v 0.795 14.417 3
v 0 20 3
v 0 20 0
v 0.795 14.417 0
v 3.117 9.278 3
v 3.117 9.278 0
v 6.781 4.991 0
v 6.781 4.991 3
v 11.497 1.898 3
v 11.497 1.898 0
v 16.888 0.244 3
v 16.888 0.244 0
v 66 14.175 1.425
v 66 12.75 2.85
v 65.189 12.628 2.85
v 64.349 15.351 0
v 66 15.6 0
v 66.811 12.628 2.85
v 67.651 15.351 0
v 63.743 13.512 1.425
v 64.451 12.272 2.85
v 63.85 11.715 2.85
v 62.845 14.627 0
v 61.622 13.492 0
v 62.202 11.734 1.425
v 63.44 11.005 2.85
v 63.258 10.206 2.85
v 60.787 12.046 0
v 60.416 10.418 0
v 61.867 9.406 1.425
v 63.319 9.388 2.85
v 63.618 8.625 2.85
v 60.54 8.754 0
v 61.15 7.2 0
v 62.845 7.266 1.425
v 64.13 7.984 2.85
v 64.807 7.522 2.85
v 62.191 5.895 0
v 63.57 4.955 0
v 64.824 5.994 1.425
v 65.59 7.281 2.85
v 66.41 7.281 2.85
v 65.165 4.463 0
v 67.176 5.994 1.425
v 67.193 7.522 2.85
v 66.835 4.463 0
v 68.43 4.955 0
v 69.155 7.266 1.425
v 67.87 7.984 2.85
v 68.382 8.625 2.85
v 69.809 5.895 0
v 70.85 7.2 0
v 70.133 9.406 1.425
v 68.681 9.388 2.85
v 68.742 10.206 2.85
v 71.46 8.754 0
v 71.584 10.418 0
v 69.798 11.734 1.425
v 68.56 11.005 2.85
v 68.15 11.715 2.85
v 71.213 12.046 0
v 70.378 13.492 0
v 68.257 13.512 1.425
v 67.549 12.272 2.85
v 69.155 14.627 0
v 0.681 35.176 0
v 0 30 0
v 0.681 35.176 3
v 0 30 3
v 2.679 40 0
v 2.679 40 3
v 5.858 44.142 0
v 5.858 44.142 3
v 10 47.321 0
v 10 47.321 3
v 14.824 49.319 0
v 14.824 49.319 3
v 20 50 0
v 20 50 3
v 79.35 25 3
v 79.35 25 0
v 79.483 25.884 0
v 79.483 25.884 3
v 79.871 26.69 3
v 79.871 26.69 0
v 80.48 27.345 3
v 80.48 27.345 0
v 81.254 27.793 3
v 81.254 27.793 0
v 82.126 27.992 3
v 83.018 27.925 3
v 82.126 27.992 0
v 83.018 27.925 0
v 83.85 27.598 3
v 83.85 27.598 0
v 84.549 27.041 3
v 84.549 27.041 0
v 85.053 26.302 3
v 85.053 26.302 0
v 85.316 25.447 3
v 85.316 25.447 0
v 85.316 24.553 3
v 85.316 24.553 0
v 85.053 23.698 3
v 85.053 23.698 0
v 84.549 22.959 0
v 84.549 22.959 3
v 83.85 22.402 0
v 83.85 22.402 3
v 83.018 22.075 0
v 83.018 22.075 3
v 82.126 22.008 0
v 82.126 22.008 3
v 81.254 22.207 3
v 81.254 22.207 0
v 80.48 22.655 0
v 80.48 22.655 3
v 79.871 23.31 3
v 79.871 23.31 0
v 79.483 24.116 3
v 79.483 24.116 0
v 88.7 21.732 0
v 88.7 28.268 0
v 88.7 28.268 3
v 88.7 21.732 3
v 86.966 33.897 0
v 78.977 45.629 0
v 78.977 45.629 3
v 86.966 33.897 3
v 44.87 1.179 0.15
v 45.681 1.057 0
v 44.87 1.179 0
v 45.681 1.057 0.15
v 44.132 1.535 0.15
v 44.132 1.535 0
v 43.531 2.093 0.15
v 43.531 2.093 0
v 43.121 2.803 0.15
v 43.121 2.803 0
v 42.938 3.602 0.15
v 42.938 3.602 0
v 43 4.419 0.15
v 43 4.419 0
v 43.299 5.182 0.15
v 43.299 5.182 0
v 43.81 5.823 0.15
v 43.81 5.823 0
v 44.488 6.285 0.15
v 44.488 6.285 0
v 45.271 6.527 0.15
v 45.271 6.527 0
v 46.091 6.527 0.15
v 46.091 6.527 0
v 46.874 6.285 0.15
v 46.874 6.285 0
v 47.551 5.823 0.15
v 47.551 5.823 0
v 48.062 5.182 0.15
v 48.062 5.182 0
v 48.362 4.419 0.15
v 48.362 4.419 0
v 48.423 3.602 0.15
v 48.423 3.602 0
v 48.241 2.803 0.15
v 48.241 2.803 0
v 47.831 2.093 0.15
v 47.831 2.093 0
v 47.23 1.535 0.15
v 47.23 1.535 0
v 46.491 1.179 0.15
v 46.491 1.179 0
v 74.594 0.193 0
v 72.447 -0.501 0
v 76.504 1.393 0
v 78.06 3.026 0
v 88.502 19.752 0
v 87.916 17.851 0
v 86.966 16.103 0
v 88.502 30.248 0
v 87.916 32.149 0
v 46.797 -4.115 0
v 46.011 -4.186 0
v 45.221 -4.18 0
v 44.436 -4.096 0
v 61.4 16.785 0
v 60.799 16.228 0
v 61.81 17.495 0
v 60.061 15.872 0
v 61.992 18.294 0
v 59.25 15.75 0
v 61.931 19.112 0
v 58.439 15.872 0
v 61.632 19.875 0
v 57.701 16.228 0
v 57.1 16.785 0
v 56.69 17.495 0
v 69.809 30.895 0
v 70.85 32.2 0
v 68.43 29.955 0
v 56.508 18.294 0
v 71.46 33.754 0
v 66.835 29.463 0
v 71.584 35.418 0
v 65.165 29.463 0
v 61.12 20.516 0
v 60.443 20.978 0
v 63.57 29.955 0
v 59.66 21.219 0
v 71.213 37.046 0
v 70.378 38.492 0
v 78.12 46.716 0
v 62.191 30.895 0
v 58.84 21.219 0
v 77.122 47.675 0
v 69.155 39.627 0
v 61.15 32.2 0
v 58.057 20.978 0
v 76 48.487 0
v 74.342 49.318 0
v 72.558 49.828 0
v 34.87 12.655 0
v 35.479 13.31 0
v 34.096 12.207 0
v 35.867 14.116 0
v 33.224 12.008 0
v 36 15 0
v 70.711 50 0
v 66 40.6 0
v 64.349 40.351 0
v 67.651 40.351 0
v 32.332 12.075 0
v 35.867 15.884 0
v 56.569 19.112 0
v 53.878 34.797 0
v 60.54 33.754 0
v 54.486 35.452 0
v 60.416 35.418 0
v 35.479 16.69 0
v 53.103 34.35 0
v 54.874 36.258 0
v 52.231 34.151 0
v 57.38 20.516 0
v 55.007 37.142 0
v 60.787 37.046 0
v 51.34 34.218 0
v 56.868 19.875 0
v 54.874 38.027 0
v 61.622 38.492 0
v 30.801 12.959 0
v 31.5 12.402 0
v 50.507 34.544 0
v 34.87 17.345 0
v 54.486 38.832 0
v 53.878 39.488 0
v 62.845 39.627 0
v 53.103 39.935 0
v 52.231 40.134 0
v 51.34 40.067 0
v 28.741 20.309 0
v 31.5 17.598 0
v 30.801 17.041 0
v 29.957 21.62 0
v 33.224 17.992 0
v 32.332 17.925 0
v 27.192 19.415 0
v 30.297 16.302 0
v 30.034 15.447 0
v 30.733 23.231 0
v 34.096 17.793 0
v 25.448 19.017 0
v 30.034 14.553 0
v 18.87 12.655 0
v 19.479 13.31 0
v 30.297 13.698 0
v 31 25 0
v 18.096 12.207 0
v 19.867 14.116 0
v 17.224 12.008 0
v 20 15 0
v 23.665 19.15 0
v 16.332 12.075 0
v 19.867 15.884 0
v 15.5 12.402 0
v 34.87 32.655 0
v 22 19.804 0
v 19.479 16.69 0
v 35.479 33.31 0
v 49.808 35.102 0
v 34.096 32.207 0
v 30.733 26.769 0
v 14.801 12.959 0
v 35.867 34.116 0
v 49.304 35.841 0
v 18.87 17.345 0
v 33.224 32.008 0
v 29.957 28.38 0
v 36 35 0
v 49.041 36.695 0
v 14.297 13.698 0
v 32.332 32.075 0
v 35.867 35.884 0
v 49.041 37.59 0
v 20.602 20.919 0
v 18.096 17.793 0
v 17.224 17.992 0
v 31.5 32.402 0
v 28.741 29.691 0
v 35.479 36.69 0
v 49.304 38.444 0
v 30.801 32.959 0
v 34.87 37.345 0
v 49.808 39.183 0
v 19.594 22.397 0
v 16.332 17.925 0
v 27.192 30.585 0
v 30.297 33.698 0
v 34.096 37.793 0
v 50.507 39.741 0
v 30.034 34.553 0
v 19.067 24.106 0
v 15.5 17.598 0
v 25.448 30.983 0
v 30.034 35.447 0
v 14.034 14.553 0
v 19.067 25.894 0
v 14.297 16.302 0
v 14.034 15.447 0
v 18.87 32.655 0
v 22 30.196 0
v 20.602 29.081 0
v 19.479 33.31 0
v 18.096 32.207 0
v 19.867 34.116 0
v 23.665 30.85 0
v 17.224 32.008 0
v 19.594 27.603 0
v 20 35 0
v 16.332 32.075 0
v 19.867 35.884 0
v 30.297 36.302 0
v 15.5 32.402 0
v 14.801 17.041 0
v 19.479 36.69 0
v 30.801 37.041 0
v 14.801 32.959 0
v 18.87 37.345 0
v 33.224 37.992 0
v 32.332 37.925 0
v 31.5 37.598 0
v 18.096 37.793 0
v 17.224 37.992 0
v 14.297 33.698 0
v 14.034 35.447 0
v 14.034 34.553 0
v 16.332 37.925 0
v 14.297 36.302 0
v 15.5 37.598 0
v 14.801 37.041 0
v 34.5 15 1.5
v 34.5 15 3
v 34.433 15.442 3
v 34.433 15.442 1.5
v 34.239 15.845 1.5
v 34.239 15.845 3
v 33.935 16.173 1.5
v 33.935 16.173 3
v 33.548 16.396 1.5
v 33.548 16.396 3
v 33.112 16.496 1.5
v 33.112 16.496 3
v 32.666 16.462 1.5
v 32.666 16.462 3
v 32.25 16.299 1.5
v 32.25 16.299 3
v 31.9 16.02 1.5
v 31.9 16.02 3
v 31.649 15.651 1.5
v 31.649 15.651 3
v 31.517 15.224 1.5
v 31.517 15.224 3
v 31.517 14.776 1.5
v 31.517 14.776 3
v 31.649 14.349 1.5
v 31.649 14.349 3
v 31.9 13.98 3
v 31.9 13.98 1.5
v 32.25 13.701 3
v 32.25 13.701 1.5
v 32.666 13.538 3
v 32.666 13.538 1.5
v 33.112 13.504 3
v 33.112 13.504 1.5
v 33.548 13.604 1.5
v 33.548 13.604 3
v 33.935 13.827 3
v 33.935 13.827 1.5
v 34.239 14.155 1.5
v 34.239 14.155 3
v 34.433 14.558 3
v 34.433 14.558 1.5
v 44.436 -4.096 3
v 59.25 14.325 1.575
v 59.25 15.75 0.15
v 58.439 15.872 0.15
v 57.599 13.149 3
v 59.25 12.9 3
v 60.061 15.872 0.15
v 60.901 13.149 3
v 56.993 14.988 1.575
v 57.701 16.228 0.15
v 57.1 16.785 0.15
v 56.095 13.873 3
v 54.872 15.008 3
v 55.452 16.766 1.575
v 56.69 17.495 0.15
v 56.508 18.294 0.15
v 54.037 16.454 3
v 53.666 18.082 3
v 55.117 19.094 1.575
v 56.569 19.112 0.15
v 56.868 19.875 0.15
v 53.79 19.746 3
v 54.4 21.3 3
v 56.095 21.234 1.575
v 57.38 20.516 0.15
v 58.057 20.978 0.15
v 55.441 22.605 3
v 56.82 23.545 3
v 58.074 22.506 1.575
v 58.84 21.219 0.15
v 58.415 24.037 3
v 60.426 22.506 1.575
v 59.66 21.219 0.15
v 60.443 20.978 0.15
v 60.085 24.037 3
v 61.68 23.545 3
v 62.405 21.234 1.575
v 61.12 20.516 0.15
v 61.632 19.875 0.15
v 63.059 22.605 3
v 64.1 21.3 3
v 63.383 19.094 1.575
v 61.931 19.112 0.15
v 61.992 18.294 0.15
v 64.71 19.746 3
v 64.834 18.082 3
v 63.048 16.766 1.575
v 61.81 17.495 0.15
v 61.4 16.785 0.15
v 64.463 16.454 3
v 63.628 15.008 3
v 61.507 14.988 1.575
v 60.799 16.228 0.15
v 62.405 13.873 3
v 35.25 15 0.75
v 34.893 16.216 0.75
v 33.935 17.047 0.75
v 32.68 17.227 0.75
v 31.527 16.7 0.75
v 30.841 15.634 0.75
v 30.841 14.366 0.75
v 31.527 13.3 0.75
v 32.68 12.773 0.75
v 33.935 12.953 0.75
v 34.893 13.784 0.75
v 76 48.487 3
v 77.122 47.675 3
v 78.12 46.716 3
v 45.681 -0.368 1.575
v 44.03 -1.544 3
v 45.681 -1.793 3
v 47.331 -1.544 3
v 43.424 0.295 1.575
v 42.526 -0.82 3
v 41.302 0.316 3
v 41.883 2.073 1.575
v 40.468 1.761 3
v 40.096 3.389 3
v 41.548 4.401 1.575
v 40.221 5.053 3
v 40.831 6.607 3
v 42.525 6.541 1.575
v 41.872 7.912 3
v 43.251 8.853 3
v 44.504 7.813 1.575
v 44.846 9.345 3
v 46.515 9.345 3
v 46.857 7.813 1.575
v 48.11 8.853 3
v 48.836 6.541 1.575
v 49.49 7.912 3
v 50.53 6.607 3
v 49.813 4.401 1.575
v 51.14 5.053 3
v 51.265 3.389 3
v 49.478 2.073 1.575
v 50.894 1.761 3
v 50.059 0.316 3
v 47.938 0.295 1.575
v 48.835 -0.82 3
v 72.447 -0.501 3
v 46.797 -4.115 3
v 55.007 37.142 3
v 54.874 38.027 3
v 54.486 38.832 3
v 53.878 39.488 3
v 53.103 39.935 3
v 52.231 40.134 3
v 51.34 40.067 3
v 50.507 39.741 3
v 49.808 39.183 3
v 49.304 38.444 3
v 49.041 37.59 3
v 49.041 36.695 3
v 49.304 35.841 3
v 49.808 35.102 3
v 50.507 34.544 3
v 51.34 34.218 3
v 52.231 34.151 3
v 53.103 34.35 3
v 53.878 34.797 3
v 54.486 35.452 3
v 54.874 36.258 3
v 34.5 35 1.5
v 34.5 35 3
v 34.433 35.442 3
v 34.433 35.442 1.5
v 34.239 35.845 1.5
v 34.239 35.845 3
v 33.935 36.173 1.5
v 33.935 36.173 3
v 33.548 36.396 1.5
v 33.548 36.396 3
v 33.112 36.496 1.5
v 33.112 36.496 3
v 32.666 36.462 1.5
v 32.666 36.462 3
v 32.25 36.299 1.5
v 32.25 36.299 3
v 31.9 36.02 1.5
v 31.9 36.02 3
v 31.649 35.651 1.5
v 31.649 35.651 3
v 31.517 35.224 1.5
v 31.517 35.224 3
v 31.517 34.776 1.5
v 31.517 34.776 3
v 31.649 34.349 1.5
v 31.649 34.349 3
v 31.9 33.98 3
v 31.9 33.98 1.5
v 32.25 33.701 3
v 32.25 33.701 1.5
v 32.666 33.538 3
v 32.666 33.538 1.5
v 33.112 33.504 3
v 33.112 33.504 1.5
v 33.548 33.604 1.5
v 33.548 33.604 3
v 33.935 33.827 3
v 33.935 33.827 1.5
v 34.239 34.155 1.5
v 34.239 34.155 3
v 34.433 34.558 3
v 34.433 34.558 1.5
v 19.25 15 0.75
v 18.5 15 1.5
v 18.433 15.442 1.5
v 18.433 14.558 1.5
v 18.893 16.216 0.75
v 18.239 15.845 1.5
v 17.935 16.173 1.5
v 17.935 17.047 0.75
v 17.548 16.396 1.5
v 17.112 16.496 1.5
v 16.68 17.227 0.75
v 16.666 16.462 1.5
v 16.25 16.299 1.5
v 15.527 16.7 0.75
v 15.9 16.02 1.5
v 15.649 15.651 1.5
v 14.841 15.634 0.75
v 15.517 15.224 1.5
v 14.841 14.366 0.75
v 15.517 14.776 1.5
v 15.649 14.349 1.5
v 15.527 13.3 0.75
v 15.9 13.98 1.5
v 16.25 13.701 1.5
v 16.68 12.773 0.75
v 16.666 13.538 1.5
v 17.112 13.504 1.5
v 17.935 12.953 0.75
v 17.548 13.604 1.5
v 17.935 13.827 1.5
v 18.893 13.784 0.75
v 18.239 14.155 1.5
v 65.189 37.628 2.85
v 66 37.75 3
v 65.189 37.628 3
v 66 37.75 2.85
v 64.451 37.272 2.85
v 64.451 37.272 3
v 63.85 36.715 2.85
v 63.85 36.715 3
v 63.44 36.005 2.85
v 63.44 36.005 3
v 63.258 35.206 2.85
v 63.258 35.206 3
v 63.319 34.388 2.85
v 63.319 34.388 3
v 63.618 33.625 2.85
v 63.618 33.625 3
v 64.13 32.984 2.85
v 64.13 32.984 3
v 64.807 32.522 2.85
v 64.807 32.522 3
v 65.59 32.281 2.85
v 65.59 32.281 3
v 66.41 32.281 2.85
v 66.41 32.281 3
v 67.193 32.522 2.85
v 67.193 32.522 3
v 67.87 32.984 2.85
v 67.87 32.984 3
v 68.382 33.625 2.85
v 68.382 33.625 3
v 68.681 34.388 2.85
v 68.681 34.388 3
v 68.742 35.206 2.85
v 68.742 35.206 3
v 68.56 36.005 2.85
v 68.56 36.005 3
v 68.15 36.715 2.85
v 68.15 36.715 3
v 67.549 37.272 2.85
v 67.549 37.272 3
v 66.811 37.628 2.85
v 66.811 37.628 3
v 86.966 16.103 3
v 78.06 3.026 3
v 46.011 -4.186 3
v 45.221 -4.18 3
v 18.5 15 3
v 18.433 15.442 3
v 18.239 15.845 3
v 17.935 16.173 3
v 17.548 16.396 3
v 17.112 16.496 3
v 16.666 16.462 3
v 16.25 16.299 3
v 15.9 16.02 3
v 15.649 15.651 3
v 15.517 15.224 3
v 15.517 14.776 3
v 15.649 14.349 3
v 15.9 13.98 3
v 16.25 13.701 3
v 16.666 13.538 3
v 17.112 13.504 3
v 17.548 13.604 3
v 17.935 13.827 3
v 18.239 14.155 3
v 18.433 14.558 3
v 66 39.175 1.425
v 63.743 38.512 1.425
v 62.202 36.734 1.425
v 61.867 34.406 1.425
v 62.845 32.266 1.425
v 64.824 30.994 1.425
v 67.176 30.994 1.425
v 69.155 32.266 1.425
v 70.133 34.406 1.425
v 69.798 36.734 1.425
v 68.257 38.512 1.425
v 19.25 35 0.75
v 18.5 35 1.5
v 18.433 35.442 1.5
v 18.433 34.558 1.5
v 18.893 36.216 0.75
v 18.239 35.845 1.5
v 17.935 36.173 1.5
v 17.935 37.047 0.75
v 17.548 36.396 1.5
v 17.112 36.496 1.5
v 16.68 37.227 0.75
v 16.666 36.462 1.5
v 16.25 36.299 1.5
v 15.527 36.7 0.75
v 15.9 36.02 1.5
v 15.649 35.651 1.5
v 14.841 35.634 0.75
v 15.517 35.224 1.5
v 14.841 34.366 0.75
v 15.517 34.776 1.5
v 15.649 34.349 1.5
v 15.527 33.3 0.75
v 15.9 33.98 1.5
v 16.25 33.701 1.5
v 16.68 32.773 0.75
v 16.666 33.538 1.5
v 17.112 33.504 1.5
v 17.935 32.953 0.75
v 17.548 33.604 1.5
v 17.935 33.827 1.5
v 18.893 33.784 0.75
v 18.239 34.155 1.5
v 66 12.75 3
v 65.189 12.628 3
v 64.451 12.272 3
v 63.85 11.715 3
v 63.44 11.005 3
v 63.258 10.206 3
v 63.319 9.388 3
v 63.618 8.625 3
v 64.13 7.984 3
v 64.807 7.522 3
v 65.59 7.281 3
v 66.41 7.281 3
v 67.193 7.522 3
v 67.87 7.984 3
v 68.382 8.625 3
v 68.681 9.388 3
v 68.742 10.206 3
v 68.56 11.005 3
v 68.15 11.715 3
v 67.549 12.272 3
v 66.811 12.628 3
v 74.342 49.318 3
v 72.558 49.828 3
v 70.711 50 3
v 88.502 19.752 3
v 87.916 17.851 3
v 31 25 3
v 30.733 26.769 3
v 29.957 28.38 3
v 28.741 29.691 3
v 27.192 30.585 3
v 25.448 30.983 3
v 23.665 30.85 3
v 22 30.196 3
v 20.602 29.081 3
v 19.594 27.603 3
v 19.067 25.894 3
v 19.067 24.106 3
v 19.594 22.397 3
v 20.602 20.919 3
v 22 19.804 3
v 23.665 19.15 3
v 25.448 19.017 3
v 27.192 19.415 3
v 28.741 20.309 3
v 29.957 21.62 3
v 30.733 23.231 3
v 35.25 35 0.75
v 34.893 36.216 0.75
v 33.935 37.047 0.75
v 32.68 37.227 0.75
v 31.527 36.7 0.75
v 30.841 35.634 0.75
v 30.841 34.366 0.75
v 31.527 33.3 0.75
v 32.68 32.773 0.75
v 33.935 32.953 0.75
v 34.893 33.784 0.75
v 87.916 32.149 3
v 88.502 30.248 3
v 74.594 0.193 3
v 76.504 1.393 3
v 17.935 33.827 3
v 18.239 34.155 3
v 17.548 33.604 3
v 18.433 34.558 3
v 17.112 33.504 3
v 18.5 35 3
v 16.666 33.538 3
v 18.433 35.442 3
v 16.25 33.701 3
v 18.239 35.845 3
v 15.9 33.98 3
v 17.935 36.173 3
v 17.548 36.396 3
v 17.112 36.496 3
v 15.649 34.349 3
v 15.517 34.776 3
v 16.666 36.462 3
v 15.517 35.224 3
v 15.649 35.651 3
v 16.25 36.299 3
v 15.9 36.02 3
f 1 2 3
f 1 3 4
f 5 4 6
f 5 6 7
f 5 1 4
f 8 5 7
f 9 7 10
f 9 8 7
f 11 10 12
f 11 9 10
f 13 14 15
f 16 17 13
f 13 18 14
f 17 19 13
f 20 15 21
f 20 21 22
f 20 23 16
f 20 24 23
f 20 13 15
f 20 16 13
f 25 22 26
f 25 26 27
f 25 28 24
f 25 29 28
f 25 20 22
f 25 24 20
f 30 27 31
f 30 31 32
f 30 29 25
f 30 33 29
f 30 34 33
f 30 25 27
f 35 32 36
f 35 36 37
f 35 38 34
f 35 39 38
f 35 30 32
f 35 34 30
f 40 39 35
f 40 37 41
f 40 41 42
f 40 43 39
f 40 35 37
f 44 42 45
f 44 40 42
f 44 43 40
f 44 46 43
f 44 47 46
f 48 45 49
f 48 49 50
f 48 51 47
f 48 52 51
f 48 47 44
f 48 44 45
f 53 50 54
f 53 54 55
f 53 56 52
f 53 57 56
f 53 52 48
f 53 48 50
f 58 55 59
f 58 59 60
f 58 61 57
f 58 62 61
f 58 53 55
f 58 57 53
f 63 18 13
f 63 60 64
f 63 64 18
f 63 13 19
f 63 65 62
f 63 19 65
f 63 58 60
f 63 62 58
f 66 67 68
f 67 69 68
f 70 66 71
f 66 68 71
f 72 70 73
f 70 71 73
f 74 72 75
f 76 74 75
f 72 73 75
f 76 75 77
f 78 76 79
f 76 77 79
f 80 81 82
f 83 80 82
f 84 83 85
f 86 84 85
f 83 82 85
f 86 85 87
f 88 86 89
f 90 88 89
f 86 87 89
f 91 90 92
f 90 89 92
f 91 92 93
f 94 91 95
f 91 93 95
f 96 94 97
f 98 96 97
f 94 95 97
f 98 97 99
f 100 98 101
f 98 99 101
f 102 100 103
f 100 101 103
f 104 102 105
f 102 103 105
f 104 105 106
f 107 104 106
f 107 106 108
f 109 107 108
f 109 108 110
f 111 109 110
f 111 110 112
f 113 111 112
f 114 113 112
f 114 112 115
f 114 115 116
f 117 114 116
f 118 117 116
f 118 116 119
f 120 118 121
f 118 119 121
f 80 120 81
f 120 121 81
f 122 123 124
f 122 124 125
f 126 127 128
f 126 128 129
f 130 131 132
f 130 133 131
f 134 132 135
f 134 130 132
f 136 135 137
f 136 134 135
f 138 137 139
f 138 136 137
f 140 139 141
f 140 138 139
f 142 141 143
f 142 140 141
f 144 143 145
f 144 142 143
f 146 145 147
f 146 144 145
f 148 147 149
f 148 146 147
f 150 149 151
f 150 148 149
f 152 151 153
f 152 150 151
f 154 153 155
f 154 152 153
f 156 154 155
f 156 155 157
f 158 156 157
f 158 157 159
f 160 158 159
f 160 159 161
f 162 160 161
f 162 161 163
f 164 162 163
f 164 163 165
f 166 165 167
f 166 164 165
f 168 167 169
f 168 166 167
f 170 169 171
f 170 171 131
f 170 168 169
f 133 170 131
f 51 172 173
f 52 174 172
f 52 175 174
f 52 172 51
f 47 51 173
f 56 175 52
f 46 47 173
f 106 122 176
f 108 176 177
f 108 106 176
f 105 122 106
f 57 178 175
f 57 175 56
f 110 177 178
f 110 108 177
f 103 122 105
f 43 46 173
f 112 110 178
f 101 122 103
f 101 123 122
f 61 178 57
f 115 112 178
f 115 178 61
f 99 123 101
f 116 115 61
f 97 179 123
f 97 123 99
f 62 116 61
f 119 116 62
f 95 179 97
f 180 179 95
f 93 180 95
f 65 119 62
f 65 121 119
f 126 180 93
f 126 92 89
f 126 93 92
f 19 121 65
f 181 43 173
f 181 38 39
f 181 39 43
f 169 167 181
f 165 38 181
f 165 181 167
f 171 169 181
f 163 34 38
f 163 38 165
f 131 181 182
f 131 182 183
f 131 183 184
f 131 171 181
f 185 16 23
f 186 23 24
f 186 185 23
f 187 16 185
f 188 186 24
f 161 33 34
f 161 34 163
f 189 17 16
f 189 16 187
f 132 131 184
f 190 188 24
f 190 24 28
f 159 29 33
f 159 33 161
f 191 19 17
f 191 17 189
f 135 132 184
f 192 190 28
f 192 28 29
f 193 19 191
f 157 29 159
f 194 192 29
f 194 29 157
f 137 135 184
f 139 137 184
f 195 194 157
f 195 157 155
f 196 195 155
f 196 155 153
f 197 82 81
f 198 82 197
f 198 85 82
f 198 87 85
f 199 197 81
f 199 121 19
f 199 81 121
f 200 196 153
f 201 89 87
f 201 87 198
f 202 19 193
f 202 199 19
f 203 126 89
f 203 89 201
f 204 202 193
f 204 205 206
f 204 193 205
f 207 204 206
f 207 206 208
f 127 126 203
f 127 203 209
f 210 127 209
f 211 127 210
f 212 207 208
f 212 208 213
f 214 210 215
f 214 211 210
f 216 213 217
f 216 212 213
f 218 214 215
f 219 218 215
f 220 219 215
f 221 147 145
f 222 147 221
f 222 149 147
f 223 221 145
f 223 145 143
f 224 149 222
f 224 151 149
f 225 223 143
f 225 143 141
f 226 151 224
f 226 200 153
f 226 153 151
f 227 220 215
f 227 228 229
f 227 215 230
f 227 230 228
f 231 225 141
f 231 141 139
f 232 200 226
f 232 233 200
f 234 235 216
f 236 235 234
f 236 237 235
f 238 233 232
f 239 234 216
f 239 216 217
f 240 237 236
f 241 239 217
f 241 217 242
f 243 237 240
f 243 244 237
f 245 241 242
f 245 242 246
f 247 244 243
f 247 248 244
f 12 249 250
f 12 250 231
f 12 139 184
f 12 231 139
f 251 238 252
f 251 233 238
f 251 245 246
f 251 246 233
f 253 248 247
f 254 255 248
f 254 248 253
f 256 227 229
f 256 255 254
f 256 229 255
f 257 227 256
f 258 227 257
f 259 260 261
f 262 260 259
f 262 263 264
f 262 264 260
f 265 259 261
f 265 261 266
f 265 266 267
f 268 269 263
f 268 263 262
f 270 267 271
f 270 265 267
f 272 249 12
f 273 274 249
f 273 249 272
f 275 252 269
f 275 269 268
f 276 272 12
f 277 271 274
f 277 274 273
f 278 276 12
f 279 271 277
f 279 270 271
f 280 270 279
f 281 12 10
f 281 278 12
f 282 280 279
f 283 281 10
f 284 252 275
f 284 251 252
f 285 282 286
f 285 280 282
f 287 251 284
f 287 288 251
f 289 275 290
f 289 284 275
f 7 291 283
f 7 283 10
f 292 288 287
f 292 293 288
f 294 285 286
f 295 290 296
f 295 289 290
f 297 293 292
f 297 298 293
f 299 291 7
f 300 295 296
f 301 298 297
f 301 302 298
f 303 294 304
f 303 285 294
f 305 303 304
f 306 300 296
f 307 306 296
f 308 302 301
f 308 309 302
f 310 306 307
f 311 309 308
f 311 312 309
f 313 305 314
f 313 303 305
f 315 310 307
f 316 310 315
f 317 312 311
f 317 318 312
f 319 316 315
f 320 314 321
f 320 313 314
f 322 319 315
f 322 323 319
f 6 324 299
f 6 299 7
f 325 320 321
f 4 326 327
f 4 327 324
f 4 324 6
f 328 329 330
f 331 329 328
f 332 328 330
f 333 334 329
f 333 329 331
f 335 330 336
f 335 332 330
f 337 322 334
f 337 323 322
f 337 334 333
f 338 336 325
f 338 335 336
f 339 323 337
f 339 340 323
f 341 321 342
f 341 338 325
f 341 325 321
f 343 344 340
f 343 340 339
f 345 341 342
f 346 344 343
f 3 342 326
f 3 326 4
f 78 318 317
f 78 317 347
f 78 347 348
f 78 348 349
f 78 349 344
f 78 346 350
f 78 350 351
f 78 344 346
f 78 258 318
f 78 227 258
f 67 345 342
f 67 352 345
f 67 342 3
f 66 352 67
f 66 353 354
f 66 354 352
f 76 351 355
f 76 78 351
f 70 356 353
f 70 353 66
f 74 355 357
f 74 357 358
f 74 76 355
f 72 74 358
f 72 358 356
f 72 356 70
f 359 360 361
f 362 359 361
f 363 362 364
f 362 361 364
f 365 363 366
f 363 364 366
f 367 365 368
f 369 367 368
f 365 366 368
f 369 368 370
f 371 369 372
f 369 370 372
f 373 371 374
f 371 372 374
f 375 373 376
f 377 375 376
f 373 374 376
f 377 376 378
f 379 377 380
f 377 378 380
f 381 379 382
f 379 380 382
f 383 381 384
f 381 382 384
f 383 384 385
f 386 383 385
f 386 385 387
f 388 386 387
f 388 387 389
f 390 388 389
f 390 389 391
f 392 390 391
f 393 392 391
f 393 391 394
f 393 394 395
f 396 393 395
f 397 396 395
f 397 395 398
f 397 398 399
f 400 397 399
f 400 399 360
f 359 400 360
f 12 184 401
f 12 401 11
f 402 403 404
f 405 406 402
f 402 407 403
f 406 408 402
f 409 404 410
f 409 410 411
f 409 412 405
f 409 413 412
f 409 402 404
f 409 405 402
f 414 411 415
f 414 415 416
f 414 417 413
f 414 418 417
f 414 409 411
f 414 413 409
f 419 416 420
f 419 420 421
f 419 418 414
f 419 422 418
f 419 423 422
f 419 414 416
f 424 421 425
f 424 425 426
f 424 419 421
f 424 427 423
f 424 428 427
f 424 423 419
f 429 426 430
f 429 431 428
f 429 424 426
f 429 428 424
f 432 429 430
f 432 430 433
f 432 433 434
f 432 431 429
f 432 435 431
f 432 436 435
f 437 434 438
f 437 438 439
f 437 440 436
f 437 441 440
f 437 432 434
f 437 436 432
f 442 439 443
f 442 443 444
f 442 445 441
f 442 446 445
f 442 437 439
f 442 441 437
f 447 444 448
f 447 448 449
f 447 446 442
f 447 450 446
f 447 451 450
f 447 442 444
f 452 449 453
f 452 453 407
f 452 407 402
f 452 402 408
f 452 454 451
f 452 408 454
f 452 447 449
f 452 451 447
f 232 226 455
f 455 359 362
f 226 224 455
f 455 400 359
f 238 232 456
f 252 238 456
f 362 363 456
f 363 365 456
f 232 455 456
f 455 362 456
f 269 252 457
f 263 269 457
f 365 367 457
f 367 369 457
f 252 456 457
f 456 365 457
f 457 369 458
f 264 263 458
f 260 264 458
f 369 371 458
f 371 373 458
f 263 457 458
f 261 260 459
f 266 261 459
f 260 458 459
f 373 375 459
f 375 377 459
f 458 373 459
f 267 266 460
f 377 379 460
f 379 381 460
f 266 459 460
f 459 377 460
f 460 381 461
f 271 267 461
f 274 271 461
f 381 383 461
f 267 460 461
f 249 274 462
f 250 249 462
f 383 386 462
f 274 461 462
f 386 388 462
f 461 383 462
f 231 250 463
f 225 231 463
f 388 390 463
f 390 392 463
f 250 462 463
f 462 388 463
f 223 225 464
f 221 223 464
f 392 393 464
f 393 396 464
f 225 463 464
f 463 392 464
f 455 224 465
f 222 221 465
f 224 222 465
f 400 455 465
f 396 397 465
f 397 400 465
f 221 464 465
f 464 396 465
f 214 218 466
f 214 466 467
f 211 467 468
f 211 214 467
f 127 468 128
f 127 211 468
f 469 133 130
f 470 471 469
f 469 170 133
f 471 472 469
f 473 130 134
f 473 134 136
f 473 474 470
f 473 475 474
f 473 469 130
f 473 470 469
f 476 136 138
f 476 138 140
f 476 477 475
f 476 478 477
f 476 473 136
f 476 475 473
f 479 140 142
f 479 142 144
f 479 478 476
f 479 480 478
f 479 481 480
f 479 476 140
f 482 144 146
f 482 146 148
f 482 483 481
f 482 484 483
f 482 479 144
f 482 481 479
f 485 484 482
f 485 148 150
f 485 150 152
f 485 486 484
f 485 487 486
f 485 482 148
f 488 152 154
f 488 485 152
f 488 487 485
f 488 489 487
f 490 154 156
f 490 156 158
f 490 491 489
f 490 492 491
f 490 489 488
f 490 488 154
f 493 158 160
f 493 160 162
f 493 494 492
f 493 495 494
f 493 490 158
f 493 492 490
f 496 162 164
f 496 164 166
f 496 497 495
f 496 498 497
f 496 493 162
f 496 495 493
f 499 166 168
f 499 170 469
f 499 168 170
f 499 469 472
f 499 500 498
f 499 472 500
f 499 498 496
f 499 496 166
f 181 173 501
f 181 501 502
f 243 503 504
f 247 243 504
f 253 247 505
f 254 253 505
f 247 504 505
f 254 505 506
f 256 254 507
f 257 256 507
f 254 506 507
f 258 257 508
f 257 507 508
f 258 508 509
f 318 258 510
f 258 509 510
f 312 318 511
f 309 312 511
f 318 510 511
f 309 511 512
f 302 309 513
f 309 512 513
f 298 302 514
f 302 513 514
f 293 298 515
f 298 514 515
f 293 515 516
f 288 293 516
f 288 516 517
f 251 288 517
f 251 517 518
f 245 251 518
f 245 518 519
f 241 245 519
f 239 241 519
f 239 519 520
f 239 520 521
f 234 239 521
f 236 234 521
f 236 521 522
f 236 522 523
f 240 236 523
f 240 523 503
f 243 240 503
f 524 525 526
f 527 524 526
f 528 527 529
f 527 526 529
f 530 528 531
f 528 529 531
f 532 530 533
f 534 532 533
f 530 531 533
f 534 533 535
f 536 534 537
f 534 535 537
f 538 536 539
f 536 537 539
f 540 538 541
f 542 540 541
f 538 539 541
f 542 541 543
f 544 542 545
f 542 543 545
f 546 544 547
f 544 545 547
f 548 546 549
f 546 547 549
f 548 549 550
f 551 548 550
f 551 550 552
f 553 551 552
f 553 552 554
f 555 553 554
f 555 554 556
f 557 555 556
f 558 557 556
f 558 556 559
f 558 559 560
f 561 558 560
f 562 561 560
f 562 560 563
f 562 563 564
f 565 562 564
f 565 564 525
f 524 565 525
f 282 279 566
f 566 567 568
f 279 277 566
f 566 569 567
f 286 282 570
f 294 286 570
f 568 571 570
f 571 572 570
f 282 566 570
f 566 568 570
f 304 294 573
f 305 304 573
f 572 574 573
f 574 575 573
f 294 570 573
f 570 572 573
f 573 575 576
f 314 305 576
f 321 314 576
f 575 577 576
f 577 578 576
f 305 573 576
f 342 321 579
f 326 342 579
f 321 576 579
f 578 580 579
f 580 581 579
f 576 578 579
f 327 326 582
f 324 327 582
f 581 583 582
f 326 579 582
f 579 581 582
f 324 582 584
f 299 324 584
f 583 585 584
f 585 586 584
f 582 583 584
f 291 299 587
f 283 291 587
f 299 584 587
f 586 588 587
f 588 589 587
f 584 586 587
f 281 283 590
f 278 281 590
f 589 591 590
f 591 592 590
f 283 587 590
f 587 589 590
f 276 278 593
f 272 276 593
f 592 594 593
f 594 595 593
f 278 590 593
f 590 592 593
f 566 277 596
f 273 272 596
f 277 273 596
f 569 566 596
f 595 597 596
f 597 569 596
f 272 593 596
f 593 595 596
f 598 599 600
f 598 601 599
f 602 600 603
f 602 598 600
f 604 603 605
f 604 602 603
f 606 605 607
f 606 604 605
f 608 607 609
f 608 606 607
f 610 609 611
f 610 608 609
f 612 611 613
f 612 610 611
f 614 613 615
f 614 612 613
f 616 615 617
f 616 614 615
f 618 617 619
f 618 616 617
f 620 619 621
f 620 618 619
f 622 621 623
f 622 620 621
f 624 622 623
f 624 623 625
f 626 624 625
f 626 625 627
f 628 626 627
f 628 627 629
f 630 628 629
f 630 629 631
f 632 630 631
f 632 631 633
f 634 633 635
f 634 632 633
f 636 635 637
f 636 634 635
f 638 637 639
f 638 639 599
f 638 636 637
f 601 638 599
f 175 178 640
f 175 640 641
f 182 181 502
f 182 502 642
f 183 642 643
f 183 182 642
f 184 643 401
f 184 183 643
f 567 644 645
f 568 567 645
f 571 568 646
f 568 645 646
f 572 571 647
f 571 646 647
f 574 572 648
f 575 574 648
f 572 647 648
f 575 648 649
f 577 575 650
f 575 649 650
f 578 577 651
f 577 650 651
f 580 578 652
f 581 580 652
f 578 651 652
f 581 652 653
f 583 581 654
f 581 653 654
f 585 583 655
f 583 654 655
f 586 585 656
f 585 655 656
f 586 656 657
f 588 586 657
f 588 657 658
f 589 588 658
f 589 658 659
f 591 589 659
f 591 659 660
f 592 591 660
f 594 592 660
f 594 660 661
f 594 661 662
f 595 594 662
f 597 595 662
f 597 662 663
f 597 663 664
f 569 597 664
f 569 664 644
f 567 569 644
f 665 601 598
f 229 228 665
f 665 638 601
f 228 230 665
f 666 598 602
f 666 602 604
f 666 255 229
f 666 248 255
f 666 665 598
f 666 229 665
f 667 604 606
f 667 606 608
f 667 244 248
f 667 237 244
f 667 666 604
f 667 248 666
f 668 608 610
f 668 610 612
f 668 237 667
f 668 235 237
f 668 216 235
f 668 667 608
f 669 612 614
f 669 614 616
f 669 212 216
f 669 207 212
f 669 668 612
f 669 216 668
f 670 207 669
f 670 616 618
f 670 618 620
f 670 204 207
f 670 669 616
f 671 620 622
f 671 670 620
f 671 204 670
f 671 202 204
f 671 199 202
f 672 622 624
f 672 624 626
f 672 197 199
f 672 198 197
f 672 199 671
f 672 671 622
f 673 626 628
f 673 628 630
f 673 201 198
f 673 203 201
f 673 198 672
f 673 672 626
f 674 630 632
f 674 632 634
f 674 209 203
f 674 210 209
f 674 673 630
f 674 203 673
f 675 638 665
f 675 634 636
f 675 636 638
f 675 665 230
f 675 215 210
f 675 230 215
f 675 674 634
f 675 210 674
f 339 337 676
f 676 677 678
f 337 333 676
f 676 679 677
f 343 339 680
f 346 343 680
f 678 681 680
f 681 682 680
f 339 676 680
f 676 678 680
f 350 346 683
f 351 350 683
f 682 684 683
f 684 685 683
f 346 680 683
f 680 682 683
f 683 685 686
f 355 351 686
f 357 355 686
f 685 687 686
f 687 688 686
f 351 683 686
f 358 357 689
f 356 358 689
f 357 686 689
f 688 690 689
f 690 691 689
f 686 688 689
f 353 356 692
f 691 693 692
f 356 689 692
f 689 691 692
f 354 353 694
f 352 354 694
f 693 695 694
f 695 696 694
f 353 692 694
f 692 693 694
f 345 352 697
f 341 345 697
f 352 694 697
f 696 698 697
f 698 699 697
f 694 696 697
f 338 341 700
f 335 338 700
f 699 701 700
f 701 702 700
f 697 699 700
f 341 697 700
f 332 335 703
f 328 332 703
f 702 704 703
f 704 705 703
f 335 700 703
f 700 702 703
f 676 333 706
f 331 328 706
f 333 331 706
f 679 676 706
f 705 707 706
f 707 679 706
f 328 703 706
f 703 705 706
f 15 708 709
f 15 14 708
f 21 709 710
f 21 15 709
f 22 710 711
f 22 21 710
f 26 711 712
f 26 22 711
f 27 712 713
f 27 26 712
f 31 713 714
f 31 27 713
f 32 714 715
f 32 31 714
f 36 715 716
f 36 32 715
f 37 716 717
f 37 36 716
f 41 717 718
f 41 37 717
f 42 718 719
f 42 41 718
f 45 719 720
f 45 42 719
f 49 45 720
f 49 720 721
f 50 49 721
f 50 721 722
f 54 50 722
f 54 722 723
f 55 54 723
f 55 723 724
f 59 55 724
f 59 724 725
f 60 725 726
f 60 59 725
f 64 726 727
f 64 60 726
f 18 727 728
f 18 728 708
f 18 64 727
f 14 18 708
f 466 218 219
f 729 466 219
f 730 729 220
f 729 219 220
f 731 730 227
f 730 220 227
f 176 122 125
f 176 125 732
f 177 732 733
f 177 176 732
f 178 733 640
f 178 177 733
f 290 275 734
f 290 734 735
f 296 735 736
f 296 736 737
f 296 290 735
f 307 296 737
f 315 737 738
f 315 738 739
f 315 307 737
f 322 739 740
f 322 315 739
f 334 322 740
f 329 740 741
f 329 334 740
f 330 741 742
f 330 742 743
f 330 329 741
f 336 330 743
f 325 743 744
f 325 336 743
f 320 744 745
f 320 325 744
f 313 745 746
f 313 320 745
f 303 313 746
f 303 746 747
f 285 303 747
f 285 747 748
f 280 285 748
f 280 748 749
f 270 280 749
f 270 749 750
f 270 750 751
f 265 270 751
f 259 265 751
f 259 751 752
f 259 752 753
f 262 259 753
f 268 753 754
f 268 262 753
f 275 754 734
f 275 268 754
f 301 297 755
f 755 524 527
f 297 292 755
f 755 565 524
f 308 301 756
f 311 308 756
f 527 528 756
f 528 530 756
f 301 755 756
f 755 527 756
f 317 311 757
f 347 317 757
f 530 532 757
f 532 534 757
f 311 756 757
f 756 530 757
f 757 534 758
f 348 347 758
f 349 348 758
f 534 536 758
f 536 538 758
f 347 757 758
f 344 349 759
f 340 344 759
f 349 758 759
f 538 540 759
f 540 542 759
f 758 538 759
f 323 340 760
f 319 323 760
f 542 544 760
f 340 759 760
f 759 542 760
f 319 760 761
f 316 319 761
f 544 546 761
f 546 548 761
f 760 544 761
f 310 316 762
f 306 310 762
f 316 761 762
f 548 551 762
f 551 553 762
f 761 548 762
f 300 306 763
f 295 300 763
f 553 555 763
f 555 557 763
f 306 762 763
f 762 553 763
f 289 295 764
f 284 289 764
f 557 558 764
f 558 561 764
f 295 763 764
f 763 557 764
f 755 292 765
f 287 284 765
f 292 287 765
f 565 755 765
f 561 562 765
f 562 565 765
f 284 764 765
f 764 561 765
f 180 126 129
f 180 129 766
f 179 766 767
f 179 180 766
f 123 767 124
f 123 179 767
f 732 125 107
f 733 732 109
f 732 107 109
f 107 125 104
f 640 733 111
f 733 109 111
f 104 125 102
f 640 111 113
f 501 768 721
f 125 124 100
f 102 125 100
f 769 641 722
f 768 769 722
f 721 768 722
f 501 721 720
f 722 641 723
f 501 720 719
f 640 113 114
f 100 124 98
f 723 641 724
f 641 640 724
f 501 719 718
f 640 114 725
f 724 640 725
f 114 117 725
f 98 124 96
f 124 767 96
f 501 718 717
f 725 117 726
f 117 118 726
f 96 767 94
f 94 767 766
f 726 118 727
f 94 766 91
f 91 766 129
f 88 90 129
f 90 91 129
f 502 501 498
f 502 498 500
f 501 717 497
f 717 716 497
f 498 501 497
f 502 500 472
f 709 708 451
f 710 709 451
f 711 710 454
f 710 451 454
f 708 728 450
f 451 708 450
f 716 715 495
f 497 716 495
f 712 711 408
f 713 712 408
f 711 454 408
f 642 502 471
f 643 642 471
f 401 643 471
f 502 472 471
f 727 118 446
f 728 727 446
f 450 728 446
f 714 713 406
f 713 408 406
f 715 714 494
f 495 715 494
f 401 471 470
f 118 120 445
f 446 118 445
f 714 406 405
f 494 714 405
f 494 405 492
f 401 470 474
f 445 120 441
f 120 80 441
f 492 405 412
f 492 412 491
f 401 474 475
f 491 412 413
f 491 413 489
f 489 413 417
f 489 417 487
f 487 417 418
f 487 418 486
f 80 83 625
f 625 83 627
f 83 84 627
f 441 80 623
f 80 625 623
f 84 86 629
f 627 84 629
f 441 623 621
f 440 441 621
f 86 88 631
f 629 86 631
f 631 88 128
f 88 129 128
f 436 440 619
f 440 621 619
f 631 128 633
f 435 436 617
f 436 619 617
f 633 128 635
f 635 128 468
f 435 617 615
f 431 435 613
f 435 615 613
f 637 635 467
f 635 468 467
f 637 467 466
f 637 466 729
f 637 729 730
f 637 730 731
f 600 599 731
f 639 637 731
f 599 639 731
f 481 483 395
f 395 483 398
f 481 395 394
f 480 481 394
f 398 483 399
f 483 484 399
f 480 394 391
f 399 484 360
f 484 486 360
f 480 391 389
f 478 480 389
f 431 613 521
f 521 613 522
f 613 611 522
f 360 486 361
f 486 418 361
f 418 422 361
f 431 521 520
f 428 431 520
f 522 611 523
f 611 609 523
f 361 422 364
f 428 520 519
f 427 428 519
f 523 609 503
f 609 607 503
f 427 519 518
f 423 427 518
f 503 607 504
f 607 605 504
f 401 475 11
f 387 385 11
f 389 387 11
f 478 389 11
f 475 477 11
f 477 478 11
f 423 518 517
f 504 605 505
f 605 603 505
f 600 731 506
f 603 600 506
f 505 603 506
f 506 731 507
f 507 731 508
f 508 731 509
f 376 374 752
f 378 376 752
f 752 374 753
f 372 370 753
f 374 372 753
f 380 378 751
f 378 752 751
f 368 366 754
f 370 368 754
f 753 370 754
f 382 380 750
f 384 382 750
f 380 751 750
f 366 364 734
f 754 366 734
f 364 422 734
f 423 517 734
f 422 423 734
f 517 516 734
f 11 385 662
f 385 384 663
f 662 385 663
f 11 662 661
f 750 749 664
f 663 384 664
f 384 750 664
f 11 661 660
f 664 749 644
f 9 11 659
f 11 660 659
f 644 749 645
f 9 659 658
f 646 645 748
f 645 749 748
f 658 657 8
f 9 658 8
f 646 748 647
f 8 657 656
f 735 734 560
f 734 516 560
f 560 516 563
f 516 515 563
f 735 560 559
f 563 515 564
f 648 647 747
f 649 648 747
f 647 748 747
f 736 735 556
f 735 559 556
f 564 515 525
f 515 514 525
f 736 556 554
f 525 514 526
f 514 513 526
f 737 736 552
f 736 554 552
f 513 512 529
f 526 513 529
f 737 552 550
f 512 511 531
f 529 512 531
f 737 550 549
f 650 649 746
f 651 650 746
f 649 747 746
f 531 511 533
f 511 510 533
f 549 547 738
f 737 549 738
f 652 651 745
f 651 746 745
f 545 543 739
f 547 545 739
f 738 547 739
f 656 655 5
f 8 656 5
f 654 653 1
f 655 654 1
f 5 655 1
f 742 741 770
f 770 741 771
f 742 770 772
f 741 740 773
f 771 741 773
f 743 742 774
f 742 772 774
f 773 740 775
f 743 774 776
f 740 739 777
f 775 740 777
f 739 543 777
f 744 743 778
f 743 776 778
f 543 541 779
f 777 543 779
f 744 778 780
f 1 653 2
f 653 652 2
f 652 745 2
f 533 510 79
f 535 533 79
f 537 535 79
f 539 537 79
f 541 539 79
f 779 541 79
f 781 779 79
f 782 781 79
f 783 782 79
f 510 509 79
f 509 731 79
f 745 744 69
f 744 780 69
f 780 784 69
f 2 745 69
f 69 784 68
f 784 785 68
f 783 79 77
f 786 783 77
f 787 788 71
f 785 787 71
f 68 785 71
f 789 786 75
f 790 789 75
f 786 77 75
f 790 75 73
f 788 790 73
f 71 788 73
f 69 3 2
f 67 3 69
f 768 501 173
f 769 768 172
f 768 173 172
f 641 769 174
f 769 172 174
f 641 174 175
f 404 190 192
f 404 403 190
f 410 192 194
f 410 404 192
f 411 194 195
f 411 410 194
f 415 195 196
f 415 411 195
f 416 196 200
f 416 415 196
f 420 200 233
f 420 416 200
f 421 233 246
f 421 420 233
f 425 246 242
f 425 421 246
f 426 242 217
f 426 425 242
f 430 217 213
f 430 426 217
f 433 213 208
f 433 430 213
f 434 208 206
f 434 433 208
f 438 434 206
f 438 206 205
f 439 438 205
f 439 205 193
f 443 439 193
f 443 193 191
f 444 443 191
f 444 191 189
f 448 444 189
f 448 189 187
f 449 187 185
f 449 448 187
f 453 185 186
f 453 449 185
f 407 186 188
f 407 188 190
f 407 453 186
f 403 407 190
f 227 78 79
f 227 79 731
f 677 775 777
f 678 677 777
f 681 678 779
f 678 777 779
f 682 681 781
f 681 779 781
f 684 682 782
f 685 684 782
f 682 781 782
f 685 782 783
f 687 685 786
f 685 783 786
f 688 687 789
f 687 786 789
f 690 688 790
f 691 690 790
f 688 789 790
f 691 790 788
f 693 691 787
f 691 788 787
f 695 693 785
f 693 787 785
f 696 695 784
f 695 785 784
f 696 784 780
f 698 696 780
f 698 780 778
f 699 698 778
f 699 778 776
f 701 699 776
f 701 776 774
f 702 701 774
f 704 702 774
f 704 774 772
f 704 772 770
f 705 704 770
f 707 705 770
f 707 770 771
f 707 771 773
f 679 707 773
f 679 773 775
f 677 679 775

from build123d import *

# Parameters (mm, degrees)
ESBO_O1_W                           = 76
ESBO_O1_H                           = 50
ESBO_O1_R                           = 2.5
ESBO_O1_R_2                         = 6
RESSALTO_EXTRUS_O1_DEPTH            = 3
ESBO_O2_R                           = 2.5
CORTE_EXTRUS_O1_DEPTH               = 3
FILETE1_R                           = 20
ESBO_O3_R                           = 1.5
CORTE_EXTRUS_O2_DEPTH               = 4
ESBO_O4_R                           = 2.5
ESBO_O4_R_2                         = 3
CORTE_EXTRUS_O3_DEPTH               = 4
RESSALTO_EXTRUS_O2_DEPTH            = 3
ESBO_O6_R                           = 3
RESSALTO_EXTRUS_O3_DEPTH            = 3
CORTE_EXTRUS_O4_DEPTH               = 4
CHANFRO1_SIZE                       = 1.5
ESCAREADO_PARA_SFHCS_M54_AT_2_COUNT = 2
ESCAREADO_PARA_SFHCS_M54_AT_2_PITCH = 25


with BuildPart() as part:
    # Esboço1 → Ressalto-extrusão1 (new body)
    with BuildSketch(Plane.XY):
        with Locations((38, 25)):
            Rectangle(ESBO_O1_W, ESBO_O1_H)
        with Locations((59.25, 18.5)):
            Circle(ESBO_O1_R, mode=Mode.SUBTRACT)
        with Locations((25, 25)):
            Circle(ESBO_O1_R_2, mode=Mode.SUBTRACT)
    extrude(amount=RESSALTO_EXTRUS_O1_DEPTH)

    # Esboço2 → Corte-extrusão1 (cut)
    with BuildSketch(Plane.XY.offset(3)):
        with Locations((66, 35)):
            Circle(ESBO_O2_R)
        with Locations((66, 10)):
            Circle(ESBO_O2_R)
    extrude(amount=-CORTE_EXTRUS_O1_DEPTH, mode=Mode.SUBTRACT)

    # Filete1
    filete1_edges = [part.edges().sort_by_distance(p)[0] for p in [
        (0, 50, 1.5),
        (0, 0, 1.5),
    ]]
    fillet(filete1_edges, radius=FILETE1_R)

    # Esboço3 → Corte-extrusão2 (cut, through all)
    with BuildSketch(Plane.XY.offset(3)):
        with Locations((33, 35)):
            Circle(ESBO_O3_R)
        with Locations((33, 15)):
            Circle(ESBO_O3_R)
        with Locations((17, 15)):
            Circle(ESBO_O3_R)
        with Locations((17, 35)):
            Circle(ESBO_O3_R)
    extrude(amount=-CORTE_EXTRUS_O2_DEPTH, mode=Mode.SUBTRACT)

    # Esboço4 → Corte-extrusão3 (cut, through all)
    with BuildSketch(Plane.XY.offset(3)):
        with Locations((45.680731562, 3.807316308)):
            Circle(ESBO_O4_R)
        with Locations((52.0071049, 37.142437356)):
            Circle(ESBO_O4_R_2)
    extrude(amount=-CORTE_EXTRUS_O3_DEPTH, mode=Mode.SUBTRACT)

    # Esboço5 → Ressalto-extrusão2 (add, through all)
    with BuildSketch(Plane(origin=(0, 0, 0), x_dir=(-1, 0, 0), z_dir=(0, 0, -1))):
        with BuildLine():
            Line((-20, 0), (-76, 0))
            Line((-76, 0), (-46.796939635, -4.11469761))
            ThreePointArc((-46.796939635, -4.11469761), (-45.615731629, -4.192683692), (-44.435946758, -4.095514563))
            Line((-44.435946758, -4.095514563), (-16.888140703, 0.243574926))
            ThreePointArc((-16.888140703, 0.243574926), (-18.439311288, 0.060986716), (-20, 0))
        make_face()
    extrude(amount=-RESSALTO_EXTRUS_O2_DEPTH)

    # Esboço6 → Ressalto-extrusão3 (add, through all)
    with BuildSketch(Plane(origin=(0, 0, 0), x_dir=(-1, 0, 0), z_dir=(0, 0, -1))):
        with BuildLine():
            ThreePointArc((-88.7, 21.731512949), (-88.256556331, 18.786647741), (-86.965553781, 16.102958899))
            Line((-86.965553781, 16.102958899), (-78.060298944, 3.02555711))
            ThreePointArc((-78.060298944, 3.02555711), (-77.114291558, 1.840577528), (-76, 0.812248345))
            Line((-76, 0.812248345), (-76, 48.486996415))
            ThreePointArc((-76, 48.486996415), (-77.637464746, 47.21301111), (-78.976802336, 45.628554049))
            Line((-78.976802336, 45.628554049), (-86.965553781, 33.897041101))
            ThreePointArc((-86.965553781, 33.897041101), (-88.256556331, 31.213352259), (-88.7, 28.268487051))
            Line((-88.7, 28.268487051), (-88.7, 21.731512949))
        make_face()
        with Locations((-82.35, 25)):
            Circle(ESBO_O6_R, mode=Mode.SUBTRACT)
    extrude(amount=-RESSALTO_EXTRUS_O3_DEPTH)

    # Esboço7 → Corte-extrusão4 (cut, through all)
    with BuildSketch(Plane(origin=(0, 0, 0), x_dir=(-1, 0, 0), z_dir=(0, 0, -1))):
        with BuildLine():
            ThreePointArc((-78.060298944, 3.02555711), (-77.114291558, 1.840577528), (-76, 0.812248345))
            Line((-76, 0.812248345), (-76, 0))
            Line((-76, 0), (-72.447166346, -0.500592608))
            ThreePointArc((-72.447166346, -0.500592608), (-75.585868949, 0.73376814), (-78.060298944, 3.02555711))
        make_face()
        with BuildLine():
            Line((-76, 50), (-76, 48.486996415))
            ThreePointArc((-76, 48.486996415), (-73.461706321, 49.614311316), (-70.711248555, 50))
            Line((-70.711248555, 50), (-76, 50))
        make_face()
    extrude(amount=-CORTE_EXTRUS_O4_DEPTH, mode=Mode.SUBTRACT)

    # Chanfro1
    chanfro1_edges = [part.edges().sort_by_distance(p)[0] for p in [
        (15.5, 35, 0),
        (15.5, 15, 0),
        (31.5, 15, 0),
        (31.5, 35, 0),
    ]]
    chamfer(chanfro1_edges, length=CHANFRO1_SIZE)

    # Esboço17 → Escareado para SFHCS M51 (revolve, cut)
    with BuildSketch(Plane(origin=(45.680731562, 3.807316308, 3), x_dir=(0, -1, 0), z_dir=(1, 0, 0))):
        Polygon((0, 0), (0, 3), (2.75, 3), (2.75, 2.85), (5.6, 0), align=None)
    revolve(axis=Axis((45.680731562, 3.807316308, 9.35), (0, 0, -1)), mode=Mode.SUBTRACT)

    # Esboço19 → Escareado para SFHCS M52 (revolve, cut)
    with BuildSketch(Plane(origin=(59.25, 18.5, 3), x_dir=(0, -1, 0), z_dir=(1, 0, 0))):
        Polygon((0, 0), (0, 3), (2.75, 3), (2.75, 2.85), (5.6, 0), align=None)
    revolve(axis=Axis((59.25, 18.5, 9.35), (0, 0, -1)), mode=Mode.SUBTRACT)

    # Esboço23 → Escareado para SFHCS M54 (revolve, cut)
    with BuildSketch(Plane(origin=(66, 35, 0), x_dir=(0, 1, 0), z_dir=(1, 0, 0))):
        Polygon((0, 0), (0, 3), (2.75, 3), (2.75, 2.85), (5.6, 0), align=None)
    escareado_para_sfhcs_m54 = revolve(axis=Axis((66, 35, -6.35), (0, 0, 1)), mode=Mode.SUBTRACT)

    # Escareado para SFHCS M54 at 2: Escareado para SFHCS M54 ×2
    with Locations(*[(0, -i * ESCAREADO_PARA_SFHCS_M54_AT_2_PITCH, 0) for i in range(1, ESCAREADO_PARA_SFHCS_M54_AT_2_COUNT)]):
        add(escareado_para_sfhcs_m54, mode=Mode.SUBTRACT)


solid = part.part
